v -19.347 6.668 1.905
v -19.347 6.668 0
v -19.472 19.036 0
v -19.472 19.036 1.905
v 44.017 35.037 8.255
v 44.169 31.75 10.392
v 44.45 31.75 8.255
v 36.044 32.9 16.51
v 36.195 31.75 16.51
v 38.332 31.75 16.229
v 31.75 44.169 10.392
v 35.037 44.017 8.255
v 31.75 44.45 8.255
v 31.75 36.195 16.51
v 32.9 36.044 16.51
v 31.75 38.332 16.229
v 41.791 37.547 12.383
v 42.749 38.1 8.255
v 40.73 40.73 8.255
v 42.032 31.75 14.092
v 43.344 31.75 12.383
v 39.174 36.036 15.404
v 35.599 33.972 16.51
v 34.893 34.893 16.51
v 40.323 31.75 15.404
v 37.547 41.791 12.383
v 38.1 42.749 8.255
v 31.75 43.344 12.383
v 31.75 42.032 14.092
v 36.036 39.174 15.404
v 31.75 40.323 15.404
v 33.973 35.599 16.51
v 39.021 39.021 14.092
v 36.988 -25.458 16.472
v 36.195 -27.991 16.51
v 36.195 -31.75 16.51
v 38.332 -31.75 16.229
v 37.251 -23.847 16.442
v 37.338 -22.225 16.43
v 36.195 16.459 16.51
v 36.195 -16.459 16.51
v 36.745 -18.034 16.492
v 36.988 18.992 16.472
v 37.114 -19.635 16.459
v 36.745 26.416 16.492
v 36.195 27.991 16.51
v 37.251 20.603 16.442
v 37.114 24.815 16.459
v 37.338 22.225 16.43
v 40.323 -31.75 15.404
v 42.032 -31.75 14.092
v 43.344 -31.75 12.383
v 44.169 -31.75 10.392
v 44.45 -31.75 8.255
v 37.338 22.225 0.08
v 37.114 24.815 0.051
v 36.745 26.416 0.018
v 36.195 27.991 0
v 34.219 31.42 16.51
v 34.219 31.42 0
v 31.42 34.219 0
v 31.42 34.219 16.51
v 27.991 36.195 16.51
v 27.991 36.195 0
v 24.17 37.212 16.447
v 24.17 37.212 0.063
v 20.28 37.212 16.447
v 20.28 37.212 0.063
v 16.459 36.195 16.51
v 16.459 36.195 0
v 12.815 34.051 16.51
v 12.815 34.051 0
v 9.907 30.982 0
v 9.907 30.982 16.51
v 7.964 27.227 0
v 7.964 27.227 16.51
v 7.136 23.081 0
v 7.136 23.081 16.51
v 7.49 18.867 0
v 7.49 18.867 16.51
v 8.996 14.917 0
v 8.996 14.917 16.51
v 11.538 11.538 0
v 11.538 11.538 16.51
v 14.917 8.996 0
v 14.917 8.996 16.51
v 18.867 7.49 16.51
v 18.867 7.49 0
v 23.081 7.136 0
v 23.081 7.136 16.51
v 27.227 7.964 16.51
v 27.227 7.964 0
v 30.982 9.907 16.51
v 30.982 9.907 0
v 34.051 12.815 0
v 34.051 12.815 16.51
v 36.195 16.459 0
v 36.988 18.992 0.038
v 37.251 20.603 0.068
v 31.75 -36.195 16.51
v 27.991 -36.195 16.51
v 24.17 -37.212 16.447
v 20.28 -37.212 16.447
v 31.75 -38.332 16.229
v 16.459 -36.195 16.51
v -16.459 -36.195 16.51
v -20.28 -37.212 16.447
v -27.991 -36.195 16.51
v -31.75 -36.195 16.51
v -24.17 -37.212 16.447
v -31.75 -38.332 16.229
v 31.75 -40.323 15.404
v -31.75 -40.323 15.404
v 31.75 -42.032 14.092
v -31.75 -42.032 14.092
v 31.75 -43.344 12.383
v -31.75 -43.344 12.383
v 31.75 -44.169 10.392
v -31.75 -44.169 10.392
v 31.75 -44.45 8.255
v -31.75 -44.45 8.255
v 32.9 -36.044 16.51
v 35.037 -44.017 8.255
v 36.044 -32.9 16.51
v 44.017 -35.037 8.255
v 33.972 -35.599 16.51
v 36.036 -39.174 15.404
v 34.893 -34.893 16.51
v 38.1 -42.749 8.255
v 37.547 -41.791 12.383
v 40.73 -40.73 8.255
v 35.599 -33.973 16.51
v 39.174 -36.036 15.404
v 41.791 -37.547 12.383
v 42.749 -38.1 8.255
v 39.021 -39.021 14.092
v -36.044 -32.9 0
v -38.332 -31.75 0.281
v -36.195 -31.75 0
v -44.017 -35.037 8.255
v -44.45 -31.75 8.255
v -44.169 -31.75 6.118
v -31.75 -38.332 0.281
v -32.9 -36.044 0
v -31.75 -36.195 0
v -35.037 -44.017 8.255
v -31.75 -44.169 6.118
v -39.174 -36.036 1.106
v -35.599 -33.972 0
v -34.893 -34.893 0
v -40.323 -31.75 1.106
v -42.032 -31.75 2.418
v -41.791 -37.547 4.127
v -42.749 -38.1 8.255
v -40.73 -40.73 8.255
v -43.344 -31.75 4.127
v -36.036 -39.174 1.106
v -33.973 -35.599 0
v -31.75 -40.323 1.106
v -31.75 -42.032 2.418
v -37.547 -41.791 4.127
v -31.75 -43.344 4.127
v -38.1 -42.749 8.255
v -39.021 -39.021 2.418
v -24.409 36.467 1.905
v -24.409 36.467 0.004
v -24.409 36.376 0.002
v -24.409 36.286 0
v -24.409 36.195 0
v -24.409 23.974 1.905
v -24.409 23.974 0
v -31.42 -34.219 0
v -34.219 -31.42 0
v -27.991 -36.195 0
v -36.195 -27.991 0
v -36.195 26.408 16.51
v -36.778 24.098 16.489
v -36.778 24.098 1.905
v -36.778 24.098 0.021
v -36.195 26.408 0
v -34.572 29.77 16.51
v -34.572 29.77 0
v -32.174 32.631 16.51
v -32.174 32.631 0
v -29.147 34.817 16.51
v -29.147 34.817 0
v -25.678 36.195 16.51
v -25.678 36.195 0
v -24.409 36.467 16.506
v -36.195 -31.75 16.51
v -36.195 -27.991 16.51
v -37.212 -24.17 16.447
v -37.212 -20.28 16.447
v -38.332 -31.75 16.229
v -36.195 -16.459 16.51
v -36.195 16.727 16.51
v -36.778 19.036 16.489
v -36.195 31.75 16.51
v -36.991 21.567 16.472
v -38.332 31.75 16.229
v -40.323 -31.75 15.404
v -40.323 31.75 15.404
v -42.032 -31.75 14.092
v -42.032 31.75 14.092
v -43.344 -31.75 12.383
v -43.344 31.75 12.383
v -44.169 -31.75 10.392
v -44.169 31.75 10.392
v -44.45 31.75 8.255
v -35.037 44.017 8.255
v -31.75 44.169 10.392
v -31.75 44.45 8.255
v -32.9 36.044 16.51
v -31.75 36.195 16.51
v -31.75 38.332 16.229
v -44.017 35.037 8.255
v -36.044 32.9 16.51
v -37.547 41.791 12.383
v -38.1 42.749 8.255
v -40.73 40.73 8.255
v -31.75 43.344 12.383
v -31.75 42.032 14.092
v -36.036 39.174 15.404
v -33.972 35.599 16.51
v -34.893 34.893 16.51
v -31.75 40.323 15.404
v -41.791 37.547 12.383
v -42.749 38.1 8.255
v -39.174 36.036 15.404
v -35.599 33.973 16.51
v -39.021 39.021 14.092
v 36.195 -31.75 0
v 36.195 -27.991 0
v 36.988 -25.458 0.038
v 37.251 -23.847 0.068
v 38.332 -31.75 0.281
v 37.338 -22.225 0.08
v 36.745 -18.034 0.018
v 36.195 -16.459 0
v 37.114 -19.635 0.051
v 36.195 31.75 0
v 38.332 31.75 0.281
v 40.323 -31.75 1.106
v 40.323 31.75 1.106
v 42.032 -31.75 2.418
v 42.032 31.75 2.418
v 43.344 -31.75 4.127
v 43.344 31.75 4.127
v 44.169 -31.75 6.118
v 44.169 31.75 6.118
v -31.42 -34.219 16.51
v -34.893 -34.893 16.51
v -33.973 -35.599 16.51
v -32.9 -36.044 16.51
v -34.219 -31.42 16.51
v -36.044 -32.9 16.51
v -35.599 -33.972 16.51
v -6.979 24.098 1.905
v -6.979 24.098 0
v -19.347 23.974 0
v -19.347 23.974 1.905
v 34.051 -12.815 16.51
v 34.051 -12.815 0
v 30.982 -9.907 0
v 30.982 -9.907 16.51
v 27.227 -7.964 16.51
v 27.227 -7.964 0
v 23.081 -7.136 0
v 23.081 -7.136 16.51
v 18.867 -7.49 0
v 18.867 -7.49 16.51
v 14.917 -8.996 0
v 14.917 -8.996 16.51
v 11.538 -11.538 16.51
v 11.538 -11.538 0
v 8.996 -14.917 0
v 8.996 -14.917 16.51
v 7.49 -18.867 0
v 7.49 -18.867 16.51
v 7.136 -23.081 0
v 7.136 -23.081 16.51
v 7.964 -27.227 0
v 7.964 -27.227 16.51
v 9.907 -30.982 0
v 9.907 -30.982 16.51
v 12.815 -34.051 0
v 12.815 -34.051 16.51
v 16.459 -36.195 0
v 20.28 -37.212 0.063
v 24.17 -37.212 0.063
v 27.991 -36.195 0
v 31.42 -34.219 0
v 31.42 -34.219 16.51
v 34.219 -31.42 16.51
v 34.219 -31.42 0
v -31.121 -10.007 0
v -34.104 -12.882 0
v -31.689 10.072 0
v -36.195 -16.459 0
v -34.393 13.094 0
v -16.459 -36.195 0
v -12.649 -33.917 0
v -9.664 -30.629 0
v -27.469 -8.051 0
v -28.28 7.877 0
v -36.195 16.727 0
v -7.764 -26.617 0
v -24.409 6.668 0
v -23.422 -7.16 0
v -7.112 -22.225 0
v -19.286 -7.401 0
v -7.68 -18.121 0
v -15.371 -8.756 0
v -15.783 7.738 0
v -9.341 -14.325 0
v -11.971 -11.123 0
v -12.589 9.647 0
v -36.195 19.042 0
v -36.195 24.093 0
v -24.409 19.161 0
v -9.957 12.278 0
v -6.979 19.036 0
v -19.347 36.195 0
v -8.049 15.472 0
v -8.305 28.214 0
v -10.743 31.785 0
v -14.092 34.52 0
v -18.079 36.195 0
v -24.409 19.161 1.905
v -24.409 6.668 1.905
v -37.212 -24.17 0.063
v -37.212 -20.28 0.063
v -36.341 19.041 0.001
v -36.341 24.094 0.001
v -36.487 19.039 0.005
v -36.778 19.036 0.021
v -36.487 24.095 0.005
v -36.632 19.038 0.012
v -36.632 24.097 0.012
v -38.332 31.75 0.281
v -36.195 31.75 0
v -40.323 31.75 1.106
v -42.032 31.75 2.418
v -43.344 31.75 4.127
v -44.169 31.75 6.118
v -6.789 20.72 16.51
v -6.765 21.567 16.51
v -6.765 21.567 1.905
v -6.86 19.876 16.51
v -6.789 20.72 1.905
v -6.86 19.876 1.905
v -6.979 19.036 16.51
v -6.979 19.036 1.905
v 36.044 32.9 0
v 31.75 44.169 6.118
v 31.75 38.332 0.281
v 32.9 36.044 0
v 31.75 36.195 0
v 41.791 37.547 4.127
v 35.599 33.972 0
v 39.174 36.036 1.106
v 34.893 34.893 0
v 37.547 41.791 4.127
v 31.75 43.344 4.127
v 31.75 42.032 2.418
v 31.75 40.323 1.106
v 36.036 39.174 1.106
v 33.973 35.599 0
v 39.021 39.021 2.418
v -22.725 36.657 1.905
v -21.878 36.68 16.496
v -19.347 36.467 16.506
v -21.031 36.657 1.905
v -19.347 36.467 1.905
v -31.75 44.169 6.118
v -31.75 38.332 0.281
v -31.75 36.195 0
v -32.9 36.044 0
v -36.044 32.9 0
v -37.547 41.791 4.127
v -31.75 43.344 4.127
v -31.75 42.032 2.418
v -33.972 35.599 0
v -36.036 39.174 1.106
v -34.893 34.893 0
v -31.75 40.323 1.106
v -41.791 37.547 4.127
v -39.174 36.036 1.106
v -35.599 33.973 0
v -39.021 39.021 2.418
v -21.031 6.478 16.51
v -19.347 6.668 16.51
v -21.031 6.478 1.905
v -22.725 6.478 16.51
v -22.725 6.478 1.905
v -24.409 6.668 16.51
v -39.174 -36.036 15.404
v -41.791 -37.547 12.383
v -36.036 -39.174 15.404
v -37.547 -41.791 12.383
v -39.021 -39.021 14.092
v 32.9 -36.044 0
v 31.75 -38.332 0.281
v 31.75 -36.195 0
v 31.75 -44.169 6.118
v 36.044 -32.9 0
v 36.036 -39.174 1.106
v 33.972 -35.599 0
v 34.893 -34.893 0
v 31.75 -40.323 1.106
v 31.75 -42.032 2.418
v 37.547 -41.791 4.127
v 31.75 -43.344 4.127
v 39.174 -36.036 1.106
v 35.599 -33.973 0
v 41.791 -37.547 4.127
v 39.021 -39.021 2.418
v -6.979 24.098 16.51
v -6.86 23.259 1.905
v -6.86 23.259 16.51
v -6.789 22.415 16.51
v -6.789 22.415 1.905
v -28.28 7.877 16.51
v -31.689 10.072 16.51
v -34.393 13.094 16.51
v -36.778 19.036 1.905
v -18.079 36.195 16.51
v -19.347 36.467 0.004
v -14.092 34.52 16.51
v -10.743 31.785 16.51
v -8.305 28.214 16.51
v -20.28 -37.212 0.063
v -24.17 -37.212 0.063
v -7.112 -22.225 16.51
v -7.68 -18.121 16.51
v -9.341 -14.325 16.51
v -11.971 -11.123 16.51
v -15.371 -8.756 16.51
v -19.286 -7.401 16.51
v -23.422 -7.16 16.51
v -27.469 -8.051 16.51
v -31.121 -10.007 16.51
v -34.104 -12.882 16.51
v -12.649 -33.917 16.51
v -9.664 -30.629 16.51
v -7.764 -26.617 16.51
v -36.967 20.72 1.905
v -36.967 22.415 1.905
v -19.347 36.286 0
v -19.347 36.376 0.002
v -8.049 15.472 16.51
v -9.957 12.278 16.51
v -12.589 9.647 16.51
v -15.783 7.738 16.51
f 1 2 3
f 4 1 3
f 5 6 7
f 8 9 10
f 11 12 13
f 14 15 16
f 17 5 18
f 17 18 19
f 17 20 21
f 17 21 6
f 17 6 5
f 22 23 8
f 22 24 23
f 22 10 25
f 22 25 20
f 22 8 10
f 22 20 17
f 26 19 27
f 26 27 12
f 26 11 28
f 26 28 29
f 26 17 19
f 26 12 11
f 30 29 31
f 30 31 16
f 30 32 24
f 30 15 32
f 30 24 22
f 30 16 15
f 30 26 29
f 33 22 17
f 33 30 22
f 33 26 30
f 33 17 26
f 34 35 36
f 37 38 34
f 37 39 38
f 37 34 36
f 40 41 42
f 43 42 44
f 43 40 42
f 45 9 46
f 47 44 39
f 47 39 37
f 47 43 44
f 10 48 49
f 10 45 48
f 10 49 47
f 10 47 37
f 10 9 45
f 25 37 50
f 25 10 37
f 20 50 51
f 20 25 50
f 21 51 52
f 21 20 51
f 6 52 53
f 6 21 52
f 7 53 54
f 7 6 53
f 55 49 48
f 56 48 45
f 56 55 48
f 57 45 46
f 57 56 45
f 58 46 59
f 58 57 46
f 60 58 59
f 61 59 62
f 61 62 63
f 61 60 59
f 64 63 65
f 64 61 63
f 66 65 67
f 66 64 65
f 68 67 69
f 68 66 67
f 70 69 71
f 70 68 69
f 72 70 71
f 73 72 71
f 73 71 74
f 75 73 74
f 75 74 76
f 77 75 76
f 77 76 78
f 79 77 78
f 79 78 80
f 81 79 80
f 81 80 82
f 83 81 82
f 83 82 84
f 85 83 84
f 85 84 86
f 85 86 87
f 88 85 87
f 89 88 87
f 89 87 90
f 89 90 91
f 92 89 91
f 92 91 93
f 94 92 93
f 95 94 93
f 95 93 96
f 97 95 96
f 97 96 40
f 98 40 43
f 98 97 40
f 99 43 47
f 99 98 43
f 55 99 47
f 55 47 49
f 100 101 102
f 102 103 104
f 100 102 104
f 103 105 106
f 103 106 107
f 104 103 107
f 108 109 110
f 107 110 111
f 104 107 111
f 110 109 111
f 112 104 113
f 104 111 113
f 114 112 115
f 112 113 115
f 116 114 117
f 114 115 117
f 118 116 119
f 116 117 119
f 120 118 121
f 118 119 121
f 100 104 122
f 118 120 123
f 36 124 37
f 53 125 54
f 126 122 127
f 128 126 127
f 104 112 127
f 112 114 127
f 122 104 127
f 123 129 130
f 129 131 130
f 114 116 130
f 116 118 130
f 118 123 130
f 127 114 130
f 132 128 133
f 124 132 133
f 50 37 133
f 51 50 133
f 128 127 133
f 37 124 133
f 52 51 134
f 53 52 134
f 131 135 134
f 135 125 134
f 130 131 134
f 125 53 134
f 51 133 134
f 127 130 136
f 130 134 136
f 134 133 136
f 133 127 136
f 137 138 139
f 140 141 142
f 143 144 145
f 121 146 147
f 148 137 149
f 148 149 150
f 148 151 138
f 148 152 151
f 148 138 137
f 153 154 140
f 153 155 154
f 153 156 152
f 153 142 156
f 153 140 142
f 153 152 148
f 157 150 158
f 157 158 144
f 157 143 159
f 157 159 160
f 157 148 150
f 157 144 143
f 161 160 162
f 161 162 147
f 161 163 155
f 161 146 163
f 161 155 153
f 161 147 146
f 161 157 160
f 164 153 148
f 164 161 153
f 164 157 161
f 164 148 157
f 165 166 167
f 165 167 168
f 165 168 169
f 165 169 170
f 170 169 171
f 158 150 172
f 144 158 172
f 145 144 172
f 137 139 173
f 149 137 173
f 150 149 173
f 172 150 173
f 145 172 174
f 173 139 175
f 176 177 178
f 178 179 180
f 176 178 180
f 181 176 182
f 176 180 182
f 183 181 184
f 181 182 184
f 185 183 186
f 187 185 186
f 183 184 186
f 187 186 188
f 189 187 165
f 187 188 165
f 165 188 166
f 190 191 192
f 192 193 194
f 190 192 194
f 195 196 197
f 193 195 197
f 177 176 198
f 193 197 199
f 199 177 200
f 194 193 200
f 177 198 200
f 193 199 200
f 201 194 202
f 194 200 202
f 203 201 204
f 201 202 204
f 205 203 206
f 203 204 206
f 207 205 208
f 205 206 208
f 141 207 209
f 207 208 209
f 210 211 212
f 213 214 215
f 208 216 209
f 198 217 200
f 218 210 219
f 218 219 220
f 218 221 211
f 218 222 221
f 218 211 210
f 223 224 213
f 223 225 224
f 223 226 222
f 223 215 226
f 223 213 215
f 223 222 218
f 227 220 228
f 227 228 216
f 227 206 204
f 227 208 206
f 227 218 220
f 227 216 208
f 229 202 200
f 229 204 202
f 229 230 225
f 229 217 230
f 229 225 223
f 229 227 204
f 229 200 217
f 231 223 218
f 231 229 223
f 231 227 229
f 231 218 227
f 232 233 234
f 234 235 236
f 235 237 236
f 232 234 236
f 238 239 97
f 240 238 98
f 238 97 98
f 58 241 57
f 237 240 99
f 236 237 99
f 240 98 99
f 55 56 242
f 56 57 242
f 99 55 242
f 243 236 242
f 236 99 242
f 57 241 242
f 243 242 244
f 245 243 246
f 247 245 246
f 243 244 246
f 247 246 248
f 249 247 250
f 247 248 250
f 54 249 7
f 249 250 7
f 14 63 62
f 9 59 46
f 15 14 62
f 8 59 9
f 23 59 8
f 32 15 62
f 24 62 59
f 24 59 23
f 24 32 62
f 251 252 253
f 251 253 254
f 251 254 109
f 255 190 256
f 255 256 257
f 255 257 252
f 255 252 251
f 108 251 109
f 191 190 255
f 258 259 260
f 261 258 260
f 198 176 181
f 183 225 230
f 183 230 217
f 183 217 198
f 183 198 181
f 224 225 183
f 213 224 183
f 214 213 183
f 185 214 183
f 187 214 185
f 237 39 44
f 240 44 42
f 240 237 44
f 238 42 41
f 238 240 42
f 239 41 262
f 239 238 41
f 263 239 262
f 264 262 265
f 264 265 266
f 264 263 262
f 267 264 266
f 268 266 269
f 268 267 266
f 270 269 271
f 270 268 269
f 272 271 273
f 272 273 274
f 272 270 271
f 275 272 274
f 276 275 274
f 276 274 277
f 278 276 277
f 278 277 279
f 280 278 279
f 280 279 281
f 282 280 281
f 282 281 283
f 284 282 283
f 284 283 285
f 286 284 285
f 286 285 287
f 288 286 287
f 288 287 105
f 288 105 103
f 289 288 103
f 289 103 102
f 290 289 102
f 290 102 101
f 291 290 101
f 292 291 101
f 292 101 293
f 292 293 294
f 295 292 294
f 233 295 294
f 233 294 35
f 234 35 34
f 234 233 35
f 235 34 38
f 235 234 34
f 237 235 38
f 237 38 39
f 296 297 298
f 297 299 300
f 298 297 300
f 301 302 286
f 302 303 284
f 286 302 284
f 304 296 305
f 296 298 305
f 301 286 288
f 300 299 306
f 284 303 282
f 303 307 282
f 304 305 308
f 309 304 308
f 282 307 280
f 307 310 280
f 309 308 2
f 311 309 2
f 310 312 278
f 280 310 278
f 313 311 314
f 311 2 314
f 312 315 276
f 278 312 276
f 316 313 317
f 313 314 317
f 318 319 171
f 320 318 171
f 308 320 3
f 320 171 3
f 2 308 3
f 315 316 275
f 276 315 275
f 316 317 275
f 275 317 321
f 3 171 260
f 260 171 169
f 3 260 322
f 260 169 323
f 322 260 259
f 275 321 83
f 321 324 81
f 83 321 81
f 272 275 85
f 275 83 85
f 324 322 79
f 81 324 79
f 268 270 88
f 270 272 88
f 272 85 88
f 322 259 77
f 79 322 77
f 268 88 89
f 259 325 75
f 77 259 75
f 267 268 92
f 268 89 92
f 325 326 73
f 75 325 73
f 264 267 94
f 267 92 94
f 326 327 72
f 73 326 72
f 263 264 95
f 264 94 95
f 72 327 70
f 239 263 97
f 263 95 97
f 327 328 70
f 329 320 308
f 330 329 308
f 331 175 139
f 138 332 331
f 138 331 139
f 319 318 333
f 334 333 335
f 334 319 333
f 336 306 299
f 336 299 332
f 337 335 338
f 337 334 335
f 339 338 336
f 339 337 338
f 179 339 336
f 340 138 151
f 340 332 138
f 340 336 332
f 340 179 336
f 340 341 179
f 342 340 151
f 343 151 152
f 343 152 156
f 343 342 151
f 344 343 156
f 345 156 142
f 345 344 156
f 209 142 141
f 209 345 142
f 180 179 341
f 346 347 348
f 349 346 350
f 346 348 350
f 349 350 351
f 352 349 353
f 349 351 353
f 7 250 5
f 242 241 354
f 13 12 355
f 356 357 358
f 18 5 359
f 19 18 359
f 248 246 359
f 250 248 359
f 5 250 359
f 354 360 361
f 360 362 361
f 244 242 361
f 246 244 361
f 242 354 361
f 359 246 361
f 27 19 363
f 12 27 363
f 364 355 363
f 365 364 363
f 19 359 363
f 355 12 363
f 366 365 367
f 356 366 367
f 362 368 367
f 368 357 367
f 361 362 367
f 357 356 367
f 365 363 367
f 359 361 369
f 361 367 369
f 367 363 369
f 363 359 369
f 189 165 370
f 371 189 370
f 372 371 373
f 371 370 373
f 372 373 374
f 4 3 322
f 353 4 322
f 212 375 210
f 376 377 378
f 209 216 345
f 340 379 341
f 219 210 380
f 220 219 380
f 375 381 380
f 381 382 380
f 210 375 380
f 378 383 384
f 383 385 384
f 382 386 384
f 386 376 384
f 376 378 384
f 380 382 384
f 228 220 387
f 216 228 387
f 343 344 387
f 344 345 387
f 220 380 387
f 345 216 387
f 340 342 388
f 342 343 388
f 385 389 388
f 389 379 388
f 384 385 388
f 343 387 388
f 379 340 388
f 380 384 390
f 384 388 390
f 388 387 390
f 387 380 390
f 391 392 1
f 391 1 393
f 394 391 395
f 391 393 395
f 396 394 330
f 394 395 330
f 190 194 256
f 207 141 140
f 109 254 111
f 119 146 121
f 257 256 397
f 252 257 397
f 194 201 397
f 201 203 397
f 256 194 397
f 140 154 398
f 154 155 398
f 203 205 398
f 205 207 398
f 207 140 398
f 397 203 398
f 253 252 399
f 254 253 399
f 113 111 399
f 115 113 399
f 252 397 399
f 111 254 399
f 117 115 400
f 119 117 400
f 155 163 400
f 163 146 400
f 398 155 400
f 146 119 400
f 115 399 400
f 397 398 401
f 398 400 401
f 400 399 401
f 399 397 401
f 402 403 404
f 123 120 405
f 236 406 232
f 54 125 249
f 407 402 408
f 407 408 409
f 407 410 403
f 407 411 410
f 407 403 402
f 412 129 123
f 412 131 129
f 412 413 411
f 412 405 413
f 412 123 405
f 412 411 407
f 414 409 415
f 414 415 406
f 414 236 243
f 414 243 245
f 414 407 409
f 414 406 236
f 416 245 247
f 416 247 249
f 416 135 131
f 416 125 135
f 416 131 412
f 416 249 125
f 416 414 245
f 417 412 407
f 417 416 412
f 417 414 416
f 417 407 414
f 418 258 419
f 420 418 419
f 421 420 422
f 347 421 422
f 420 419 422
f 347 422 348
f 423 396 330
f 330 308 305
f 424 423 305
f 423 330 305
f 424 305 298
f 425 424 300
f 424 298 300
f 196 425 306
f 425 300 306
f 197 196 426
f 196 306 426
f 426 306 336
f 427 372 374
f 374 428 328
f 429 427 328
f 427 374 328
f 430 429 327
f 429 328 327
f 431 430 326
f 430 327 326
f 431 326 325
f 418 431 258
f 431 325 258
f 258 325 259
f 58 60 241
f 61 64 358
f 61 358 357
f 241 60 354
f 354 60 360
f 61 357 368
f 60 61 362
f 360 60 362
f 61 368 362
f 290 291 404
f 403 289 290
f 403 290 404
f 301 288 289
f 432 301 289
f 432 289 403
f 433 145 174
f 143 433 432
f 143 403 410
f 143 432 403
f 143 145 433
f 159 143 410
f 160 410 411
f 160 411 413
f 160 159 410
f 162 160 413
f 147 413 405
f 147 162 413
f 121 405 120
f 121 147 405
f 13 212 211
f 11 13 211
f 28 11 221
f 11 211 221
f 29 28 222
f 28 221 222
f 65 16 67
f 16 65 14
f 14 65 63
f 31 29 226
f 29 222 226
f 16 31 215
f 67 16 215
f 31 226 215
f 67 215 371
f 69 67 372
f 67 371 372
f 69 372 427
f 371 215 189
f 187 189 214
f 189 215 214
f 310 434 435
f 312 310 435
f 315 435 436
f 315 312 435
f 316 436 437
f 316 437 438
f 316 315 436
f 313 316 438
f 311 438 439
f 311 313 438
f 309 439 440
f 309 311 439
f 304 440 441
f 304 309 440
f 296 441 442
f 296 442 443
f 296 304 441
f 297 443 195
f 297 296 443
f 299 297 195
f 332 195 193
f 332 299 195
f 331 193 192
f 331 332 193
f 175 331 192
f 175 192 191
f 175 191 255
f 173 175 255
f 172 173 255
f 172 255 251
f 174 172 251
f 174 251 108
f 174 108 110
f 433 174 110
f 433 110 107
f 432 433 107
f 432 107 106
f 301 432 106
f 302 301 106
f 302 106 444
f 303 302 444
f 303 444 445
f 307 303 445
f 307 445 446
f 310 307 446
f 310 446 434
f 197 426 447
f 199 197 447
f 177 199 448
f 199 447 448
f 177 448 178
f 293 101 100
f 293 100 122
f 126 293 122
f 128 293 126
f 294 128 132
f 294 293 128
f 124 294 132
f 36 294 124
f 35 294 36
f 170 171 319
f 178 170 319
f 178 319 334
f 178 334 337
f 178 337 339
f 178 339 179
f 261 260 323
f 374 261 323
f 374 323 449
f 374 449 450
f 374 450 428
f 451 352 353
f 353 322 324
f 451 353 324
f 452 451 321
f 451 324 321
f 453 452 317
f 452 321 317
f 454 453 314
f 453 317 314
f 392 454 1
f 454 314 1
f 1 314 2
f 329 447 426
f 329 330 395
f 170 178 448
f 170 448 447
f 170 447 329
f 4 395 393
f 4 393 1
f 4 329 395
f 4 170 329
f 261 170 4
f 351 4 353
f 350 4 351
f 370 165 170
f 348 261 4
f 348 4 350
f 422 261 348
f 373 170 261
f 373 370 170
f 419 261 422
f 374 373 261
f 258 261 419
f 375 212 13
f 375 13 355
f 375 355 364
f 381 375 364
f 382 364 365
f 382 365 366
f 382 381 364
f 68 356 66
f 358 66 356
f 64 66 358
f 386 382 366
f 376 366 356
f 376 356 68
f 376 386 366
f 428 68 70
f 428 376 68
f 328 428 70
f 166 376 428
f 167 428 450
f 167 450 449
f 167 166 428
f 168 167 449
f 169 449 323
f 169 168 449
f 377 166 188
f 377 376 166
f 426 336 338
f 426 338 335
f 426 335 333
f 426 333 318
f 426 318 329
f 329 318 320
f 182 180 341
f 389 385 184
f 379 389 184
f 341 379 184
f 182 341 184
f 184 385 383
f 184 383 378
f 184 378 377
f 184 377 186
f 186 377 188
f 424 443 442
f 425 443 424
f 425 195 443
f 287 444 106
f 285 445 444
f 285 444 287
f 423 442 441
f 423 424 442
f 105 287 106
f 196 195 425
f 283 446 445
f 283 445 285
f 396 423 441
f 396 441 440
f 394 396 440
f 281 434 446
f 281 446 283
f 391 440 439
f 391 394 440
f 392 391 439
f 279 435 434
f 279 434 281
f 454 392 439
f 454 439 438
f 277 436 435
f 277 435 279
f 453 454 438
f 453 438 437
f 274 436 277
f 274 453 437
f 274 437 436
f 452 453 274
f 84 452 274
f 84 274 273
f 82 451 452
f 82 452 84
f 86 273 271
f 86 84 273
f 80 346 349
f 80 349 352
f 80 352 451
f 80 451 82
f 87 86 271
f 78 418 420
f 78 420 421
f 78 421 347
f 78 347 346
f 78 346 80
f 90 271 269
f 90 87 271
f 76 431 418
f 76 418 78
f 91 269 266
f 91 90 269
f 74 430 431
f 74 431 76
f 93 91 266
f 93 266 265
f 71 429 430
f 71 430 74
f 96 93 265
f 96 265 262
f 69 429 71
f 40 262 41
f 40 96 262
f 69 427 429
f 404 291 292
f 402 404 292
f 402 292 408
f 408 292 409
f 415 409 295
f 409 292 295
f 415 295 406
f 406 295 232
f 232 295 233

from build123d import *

# Parameters (mm, degrees)
F0_R         = 15.113
F1_DEPTH     = 16.51
F2_DEPTH     = 1.905
F3_T1_DEPTH  = 63.5
F3_T3_DEPTH  = 63.5
F3_T6_ANGLE  = 90
F3_T8_ANGLE  = 90
F3_T10_ANGLE = 90
F3_T12_ANGLE = 90
F3_T14_ANGLE = 90
F3_T16_ANGLE = 90
F3_T18_ANGLE = 90
F3_T20_ANGLE = 90


# Not quite as in the source:
# - a fillet or chamfer that OpenCascade refuses, or shapes differently, is made with other operations: its cross-section is extruded or revolved along the edge and cut away or added


with BuildPart() as f1:
    # F0 (on Top) → F1 (new body)
    with BuildSketch(Plane.XY):
        with BuildLine():
            Line((31.75, 44.45), (-31.75, 44.45))
            ThreePointArc((-31.75, 44.45), (-40.7302561211, 40.7302561211), (-44.45, 31.75))
            Line((-44.45, 31.75), (-44.45, -31.75))
            ThreePointArc((-44.45, -31.75), (-40.7302561211, -40.7302561211), (-31.75, -44.45))
            Line((-31.75, -44.45), (31.75, -44.45))
            ThreePointArc((31.75, -44.45), (40.7302561211, -40.7302561211), (44.45, -31.75))
            Line((44.45, -31.75), (44.45, 31.75))
            ThreePointArc((44.45, 31.75), (40.7302561211, 40.7302561211), (31.75, 44.45))
        make_face()
        with Locations((-22.225, -22.225)):
            Circle(F0_R, mode=Mode.SUBTRACT)
        with Locations((22.225, -22.225)):
            Circle(F0_R, mode=Mode.SUBTRACT)
        with BuildLine():
            ThreePointArc((-6.9787090866, 24.098385063), (-6.8187195919, 22.8373692451), (-6.7652637085, 21.5673692451))
            ThreePointArc((-6.7652637085, 21.5673692451), (-6.8187195919, 20.2973692451), (-6.9787090866, 19.0363534272))
            ThreePointArc((-6.9787090866, 19.0363534272), (-11.1917589244, 10.880864461), (-19.3472478905, 6.6678146232))
            ThreePointArc((-19.3472478905, 6.6678146232), (-21.8782637085, 6.4543692451), (-24.4092795264, 6.6678146232))
            ThreePointArc((-24.4092795264, 6.6678146232), (-32.5647684925, 10.880864461), (-36.7778183303, 19.0363534272))
            ThreePointArc((-36.7778183303, 19.0363534272), (-36.9912637085, 21.5673692451), (-36.7778183303, 24.098385063))
            ThreePointArc((-36.7778183303, 24.098385063), (-32.5647684925, 32.2538740292), (-24.4092795264, 36.4669238669))
            ThreePointArc((-24.4092795264, 36.4669238669), (-21.8782637085, 36.6803692451), (-19.3472478905, 36.4669238669))
            ThreePointArc((-19.3472478905, 36.4669238669), (-11.1917589244, 32.2538740292), (-6.9787090866, 24.098385063))
        make_face(mode=Mode.SUBTRACT)
        with Locations((22.225, 22.225)):
            Circle(F0_R, mode=Mode.SUBTRACT)
    extrude(amount=F1_DEPTH)

    # F0 (on Top) → F2 (join)
    with BuildSketch(Plane.XY):
        with BuildLine():
            ThreePointArc((-6.9787090866, 19.0363534272), (-6.8187195919, 20.2973692451), (-6.7652637085, 21.5673692451))
            ThreePointArc((-6.7652637085, 21.5673692451), (-6.8187195919, 22.8373692451), (-6.9787090866, 24.098385063))
            Line((-6.9787090866, 24.098385063), (-19.3472478905, 23.9739259511))
            ThreePointArc((-19.3472478905, 23.9739259511), (-18.6350300602, 22.8631283867), (-18.3857637085, 21.5673692451))
            ThreePointArc((-18.3857637085, 21.5673692451), (-18.668711127, 20.1902968152), (-19.4717070024, 19.0363534272))
            Line((-19.4717070024, 19.0363534272), (-6.9787090866, 19.0363534272))
        make_face()
        with BuildLine():
            Line((-19.3472478905, 23.9739259511), (-19.3472478905, 36.4669238669))
            ThreePointArc((-19.3472478905, 36.4669238669), (-21.8782637085, 36.6803692451), (-24.4092795264, 36.4669238669))
            Line((-24.4092795264, 36.4669238669), (-24.4092795264, 23.9739259511))
            ThreePointArc((-24.4092795264, 23.9739259511), (-21.8782637085, 25.0598692451), (-19.3472478905, 23.9739259511))
        make_face()
        with BuildLine():
            ThreePointArc((-18.3857637085, 21.5673692451), (-18.6350300602, 22.8631283867), (-19.3472478905, 23.9739259511))
            ThreePointArc((-19.3472478905, 23.9739259511), (-21.8782637085, 25.0598692451), (-24.4092795264, 23.9739259511))
            ThreePointArc((-24.4092795264, 23.9739259511), (-25.3707637085, 21.5673692451), (-24.4092795264, 19.160812539))
            ThreePointArc((-24.4092795264, 19.160812539), (-21.9662695904, 18.0759782308), (-19.4717070024, 19.0363534272))
            ThreePointArc((-19.4717070024, 19.0363534272), (-18.668711127, 20.1902968152), (-18.3857637085, 21.5673692451))
        make_face()
        with BuildLine():
            ThreePointArc((-24.4092795264, 19.160812539), (-25.3707637085, 21.5673692451), (-24.4092795264, 23.9739259511))
            Line((-24.4092795264, 23.9739259511), (-36.7778183303, 24.098385063))
            ThreePointArc((-36.7778183303, 24.098385063), (-36.9912637085, 21.5673692451), (-36.7778183303, 19.0363534272))
            Line((-36.7778183303, 19.0363534272), (-24.4092795264, 19.160812539))
        make_face()
        with BuildLine():
            ThreePointArc((-24.4092795264, 6.6678146232), (-21.8782637085, 6.4543692451), (-19.3472478905, 6.6678146232))
            Line((-19.3472478905, 6.6678146232), (-19.4717070024, 19.0363534272))
            ThreePointArc((-19.4717070024, 19.0363534272), (-21.9662695904, 18.0759782308), (-24.4092795264, 19.160812539))
            Line((-24.4092795264, 19.160812539), (-24.4092795264, 6.6678146232))
        make_face()
    extrude(amount=F2_DEPTH)

    # F3: fillet of radius 8.255 on 3 edges, made by hand

    # F3_s2 → F3_t1 (cut)
    with BuildSketch(Plane.XZ.offset(-31.75)):
        with BuildLine():
            ThreePointArc((-36.195, 16.51), (-42.0321664787, 14.0921664787), (-44.45, 8.255))
            Line((-44.45, 8.255), (-44.45, 16.51))
            Line((-44.45, 16.51), (-36.195, 16.51))
        make_face()
        with BuildLine():
            ThreePointArc((36.195, 0), (42.0321664787, 2.4178335213), (44.45, 8.255))
            Line((44.45, 8.255), (44.45, 0))
            Line((44.45, 0), (36.195, 0))
        make_face()
        with BuildLine():
            ThreePointArc((-36.195, 0), (-42.0321664787, 2.4178335213), (-44.45, 8.255))
            Line((-44.45, 8.255), (-44.45, 0))
            Line((-44.45, 0), (-36.195, 0))
        make_face()
        with BuildLine():
            ThreePointArc((36.195, 16.51), (42.0321664787, 14.0921664787), (44.45, 8.255))
            Line((44.45, 8.255), (44.45, 16.51))
            Line((44.45, 16.51), (36.195, 16.51))
        make_face()
    extrude(amount=F3_T1_DEPTH, mode=Mode.SUBTRACT)

    # F3_s4 → F3_t3 (cut)
    with BuildSketch(Plane.YZ.offset(-31.75)):
        with BuildLine():
            ThreePointArc((-36.195, 0), (-42.0321664787, 2.4178335213), (-44.45, 8.255))
            Line((-44.45, 8.255), (-44.45, 0))
            Line((-44.45, 0), (-36.195, 0))
        make_face()
        with BuildLine():
            ThreePointArc((44.45, 8.255), (42.0321664787, 2.4178335213), (36.195, 0))
            Line((36.195, 0), (44.45, 0))
            Line((44.45, 0), (44.45, 8.255))
        make_face()
        with BuildLine():
            ThreePointArc((-36.195, 16.51), (-42.0321664787, 14.0921664787), (-44.45, 8.255))
            Line((-44.45, 8.255), (-44.45, 16.51))
            Line((-44.45, 16.51), (-36.195, 16.51))
        make_face()
        with BuildLine():
            ThreePointArc((44.45, 8.255), (42.0321664787, 14.0921664787), (36.195, 16.51))
            Line((36.195, 16.51), (44.45, 16.51))
            Line((44.45, 16.51), (44.45, 8.255))
        make_face()
    extrude(amount=F3_T3_DEPTH, mode=Mode.SUBTRACT)

    # F3_s5 → F3_t6 (revolve, cut)
    with BuildSketch(Plane.YZ.offset(-31.75)):
        with BuildLine():
            ThreePointArc((44.45, 8.255), (42.0321664787, 14.0921664787), (36.195, 16.51))
            Line((36.195, 16.51), (44.45, 16.51))
            Line((44.45, 16.51), (44.45, 8.255))
        make_face()
    revolve(axis=Axis((-31.75, 31.75, 16.51), (0, 0, 1)), revolution_arc=F3_T6_ANGLE, mode=Mode.SUBTRACT)

    # F3_s7 → F3_t8 (revolve, cut)
    with BuildSketch(Plane.XZ.offset(31.75)):
        with BuildLine():
            ThreePointArc((-36.195, 0), (-42.0321664787, 2.4178335213), (-44.45, 8.255))
            Line((-44.45, 8.255), (-44.45, 0))
            Line((-44.45, 0), (-36.195, 0))
        make_face()
    revolve(axis=Axis((-31.75, -31.75, 0), (0, 0, 1)), revolution_arc=F3_T8_ANGLE, mode=Mode.SUBTRACT)

    # F3_s9 → F3_t10 (revolve, cut)
    with BuildSketch(Plane.YZ.offset(31.75)):
        with BuildLine():
            ThreePointArc((-36.195, 0), (-42.0321664787, 2.4178335213), (-44.45, 8.255))
            Line((-44.45, 8.255), (-44.45, 0))
            Line((-44.45, 0), (-36.195, 0))
        make_face()
    revolve(axis=Axis((31.75, -31.75, 0), (0, 0, 1)), revolution_arc=F3_T10_ANGLE, mode=Mode.SUBTRACT)

    # F3_s11 → F3_t12 (revolve, cut)
    with BuildSketch(Plane.XZ.offset(-31.75)):
        with BuildLine():
            ThreePointArc((44.45, 8.255), (42.0321664787, 2.4178335213), (36.195, 0))
            Line((36.195, 0), (44.45, 0))
            Line((44.45, 0), (44.45, 8.255))
        make_face()
    revolve(axis=Axis((31.75, 31.75, 0), (0, 0, 1)), revolution_arc=F3_T12_ANGLE, mode=Mode.SUBTRACT)

    # F3_s13 → F3_t14 (revolve, cut)
    with BuildSketch(Plane.YZ.offset(-31.75)):
        with BuildLine():
            ThreePointArc((44.45, 8.255), (42.0321664787, 2.4178335213), (36.195, 0))
            Line((36.195, 0), (44.45, 0))
            Line((44.45, 0), (44.45, 8.255))
        make_face()
    revolve(axis=Axis((-31.75, 31.75, 0), (0, 0, 1)), revolution_arc=F3_T14_ANGLE, mode=Mode.SUBTRACT)

    # F3_s15 → F3_t16 (revolve, cut)
    with BuildSketch(Plane.XZ.offset(31.75)):
        with BuildLine():
            ThreePointArc((-36.195, 16.51), (-42.0321664787, 14.0921664787), (-44.45, 8.255))
            Line((-44.45, 8.255), (-44.45, 16.51))
            Line((-44.45, 16.51), (-36.195, 16.51))
        make_face()
    revolve(axis=Axis((-31.75, -31.75, 16.51), (0, 0, 1)), revolution_arc=F3_T16_ANGLE, mode=Mode.SUBTRACT)

    # F3_s17 → F3_t18 (revolve, cut)
    with BuildSketch(Plane.YZ.offset(31.75)):
        with BuildLine():
            ThreePointArc((-36.195, 16.51), (-42.0321664787, 14.0921664787), (-44.45, 8.255))
            Line((-44.45, 8.255), (-44.45, 16.51))
            Line((-44.45, 16.51), (-36.195, 16.51))
        make_face()
    revolve(axis=Axis((31.75, -31.75, 16.51), (0, 0, 1)), revolution_arc=F3_T18_ANGLE, mode=Mode.SUBTRACT)

    # F3_s19 → F3_t20 (revolve, cut)
    with BuildSketch(Plane.XZ.offset(-31.75)):
        with BuildLine():
            ThreePointArc((44.45, 8.255), (42.0321664787, 14.0921664787), (36.195, 16.51))
            Line((36.195, 16.51), (44.45, 16.51))
            Line((44.45, 16.51), (44.45, 8.255))
        make_face()
    revolve(axis=Axis((31.75, 31.75, 16.51), (0, 0, 1)), revolution_arc=F3_T20_ANGLE, mode=Mode.SUBTRACT)


solid = f1.part
